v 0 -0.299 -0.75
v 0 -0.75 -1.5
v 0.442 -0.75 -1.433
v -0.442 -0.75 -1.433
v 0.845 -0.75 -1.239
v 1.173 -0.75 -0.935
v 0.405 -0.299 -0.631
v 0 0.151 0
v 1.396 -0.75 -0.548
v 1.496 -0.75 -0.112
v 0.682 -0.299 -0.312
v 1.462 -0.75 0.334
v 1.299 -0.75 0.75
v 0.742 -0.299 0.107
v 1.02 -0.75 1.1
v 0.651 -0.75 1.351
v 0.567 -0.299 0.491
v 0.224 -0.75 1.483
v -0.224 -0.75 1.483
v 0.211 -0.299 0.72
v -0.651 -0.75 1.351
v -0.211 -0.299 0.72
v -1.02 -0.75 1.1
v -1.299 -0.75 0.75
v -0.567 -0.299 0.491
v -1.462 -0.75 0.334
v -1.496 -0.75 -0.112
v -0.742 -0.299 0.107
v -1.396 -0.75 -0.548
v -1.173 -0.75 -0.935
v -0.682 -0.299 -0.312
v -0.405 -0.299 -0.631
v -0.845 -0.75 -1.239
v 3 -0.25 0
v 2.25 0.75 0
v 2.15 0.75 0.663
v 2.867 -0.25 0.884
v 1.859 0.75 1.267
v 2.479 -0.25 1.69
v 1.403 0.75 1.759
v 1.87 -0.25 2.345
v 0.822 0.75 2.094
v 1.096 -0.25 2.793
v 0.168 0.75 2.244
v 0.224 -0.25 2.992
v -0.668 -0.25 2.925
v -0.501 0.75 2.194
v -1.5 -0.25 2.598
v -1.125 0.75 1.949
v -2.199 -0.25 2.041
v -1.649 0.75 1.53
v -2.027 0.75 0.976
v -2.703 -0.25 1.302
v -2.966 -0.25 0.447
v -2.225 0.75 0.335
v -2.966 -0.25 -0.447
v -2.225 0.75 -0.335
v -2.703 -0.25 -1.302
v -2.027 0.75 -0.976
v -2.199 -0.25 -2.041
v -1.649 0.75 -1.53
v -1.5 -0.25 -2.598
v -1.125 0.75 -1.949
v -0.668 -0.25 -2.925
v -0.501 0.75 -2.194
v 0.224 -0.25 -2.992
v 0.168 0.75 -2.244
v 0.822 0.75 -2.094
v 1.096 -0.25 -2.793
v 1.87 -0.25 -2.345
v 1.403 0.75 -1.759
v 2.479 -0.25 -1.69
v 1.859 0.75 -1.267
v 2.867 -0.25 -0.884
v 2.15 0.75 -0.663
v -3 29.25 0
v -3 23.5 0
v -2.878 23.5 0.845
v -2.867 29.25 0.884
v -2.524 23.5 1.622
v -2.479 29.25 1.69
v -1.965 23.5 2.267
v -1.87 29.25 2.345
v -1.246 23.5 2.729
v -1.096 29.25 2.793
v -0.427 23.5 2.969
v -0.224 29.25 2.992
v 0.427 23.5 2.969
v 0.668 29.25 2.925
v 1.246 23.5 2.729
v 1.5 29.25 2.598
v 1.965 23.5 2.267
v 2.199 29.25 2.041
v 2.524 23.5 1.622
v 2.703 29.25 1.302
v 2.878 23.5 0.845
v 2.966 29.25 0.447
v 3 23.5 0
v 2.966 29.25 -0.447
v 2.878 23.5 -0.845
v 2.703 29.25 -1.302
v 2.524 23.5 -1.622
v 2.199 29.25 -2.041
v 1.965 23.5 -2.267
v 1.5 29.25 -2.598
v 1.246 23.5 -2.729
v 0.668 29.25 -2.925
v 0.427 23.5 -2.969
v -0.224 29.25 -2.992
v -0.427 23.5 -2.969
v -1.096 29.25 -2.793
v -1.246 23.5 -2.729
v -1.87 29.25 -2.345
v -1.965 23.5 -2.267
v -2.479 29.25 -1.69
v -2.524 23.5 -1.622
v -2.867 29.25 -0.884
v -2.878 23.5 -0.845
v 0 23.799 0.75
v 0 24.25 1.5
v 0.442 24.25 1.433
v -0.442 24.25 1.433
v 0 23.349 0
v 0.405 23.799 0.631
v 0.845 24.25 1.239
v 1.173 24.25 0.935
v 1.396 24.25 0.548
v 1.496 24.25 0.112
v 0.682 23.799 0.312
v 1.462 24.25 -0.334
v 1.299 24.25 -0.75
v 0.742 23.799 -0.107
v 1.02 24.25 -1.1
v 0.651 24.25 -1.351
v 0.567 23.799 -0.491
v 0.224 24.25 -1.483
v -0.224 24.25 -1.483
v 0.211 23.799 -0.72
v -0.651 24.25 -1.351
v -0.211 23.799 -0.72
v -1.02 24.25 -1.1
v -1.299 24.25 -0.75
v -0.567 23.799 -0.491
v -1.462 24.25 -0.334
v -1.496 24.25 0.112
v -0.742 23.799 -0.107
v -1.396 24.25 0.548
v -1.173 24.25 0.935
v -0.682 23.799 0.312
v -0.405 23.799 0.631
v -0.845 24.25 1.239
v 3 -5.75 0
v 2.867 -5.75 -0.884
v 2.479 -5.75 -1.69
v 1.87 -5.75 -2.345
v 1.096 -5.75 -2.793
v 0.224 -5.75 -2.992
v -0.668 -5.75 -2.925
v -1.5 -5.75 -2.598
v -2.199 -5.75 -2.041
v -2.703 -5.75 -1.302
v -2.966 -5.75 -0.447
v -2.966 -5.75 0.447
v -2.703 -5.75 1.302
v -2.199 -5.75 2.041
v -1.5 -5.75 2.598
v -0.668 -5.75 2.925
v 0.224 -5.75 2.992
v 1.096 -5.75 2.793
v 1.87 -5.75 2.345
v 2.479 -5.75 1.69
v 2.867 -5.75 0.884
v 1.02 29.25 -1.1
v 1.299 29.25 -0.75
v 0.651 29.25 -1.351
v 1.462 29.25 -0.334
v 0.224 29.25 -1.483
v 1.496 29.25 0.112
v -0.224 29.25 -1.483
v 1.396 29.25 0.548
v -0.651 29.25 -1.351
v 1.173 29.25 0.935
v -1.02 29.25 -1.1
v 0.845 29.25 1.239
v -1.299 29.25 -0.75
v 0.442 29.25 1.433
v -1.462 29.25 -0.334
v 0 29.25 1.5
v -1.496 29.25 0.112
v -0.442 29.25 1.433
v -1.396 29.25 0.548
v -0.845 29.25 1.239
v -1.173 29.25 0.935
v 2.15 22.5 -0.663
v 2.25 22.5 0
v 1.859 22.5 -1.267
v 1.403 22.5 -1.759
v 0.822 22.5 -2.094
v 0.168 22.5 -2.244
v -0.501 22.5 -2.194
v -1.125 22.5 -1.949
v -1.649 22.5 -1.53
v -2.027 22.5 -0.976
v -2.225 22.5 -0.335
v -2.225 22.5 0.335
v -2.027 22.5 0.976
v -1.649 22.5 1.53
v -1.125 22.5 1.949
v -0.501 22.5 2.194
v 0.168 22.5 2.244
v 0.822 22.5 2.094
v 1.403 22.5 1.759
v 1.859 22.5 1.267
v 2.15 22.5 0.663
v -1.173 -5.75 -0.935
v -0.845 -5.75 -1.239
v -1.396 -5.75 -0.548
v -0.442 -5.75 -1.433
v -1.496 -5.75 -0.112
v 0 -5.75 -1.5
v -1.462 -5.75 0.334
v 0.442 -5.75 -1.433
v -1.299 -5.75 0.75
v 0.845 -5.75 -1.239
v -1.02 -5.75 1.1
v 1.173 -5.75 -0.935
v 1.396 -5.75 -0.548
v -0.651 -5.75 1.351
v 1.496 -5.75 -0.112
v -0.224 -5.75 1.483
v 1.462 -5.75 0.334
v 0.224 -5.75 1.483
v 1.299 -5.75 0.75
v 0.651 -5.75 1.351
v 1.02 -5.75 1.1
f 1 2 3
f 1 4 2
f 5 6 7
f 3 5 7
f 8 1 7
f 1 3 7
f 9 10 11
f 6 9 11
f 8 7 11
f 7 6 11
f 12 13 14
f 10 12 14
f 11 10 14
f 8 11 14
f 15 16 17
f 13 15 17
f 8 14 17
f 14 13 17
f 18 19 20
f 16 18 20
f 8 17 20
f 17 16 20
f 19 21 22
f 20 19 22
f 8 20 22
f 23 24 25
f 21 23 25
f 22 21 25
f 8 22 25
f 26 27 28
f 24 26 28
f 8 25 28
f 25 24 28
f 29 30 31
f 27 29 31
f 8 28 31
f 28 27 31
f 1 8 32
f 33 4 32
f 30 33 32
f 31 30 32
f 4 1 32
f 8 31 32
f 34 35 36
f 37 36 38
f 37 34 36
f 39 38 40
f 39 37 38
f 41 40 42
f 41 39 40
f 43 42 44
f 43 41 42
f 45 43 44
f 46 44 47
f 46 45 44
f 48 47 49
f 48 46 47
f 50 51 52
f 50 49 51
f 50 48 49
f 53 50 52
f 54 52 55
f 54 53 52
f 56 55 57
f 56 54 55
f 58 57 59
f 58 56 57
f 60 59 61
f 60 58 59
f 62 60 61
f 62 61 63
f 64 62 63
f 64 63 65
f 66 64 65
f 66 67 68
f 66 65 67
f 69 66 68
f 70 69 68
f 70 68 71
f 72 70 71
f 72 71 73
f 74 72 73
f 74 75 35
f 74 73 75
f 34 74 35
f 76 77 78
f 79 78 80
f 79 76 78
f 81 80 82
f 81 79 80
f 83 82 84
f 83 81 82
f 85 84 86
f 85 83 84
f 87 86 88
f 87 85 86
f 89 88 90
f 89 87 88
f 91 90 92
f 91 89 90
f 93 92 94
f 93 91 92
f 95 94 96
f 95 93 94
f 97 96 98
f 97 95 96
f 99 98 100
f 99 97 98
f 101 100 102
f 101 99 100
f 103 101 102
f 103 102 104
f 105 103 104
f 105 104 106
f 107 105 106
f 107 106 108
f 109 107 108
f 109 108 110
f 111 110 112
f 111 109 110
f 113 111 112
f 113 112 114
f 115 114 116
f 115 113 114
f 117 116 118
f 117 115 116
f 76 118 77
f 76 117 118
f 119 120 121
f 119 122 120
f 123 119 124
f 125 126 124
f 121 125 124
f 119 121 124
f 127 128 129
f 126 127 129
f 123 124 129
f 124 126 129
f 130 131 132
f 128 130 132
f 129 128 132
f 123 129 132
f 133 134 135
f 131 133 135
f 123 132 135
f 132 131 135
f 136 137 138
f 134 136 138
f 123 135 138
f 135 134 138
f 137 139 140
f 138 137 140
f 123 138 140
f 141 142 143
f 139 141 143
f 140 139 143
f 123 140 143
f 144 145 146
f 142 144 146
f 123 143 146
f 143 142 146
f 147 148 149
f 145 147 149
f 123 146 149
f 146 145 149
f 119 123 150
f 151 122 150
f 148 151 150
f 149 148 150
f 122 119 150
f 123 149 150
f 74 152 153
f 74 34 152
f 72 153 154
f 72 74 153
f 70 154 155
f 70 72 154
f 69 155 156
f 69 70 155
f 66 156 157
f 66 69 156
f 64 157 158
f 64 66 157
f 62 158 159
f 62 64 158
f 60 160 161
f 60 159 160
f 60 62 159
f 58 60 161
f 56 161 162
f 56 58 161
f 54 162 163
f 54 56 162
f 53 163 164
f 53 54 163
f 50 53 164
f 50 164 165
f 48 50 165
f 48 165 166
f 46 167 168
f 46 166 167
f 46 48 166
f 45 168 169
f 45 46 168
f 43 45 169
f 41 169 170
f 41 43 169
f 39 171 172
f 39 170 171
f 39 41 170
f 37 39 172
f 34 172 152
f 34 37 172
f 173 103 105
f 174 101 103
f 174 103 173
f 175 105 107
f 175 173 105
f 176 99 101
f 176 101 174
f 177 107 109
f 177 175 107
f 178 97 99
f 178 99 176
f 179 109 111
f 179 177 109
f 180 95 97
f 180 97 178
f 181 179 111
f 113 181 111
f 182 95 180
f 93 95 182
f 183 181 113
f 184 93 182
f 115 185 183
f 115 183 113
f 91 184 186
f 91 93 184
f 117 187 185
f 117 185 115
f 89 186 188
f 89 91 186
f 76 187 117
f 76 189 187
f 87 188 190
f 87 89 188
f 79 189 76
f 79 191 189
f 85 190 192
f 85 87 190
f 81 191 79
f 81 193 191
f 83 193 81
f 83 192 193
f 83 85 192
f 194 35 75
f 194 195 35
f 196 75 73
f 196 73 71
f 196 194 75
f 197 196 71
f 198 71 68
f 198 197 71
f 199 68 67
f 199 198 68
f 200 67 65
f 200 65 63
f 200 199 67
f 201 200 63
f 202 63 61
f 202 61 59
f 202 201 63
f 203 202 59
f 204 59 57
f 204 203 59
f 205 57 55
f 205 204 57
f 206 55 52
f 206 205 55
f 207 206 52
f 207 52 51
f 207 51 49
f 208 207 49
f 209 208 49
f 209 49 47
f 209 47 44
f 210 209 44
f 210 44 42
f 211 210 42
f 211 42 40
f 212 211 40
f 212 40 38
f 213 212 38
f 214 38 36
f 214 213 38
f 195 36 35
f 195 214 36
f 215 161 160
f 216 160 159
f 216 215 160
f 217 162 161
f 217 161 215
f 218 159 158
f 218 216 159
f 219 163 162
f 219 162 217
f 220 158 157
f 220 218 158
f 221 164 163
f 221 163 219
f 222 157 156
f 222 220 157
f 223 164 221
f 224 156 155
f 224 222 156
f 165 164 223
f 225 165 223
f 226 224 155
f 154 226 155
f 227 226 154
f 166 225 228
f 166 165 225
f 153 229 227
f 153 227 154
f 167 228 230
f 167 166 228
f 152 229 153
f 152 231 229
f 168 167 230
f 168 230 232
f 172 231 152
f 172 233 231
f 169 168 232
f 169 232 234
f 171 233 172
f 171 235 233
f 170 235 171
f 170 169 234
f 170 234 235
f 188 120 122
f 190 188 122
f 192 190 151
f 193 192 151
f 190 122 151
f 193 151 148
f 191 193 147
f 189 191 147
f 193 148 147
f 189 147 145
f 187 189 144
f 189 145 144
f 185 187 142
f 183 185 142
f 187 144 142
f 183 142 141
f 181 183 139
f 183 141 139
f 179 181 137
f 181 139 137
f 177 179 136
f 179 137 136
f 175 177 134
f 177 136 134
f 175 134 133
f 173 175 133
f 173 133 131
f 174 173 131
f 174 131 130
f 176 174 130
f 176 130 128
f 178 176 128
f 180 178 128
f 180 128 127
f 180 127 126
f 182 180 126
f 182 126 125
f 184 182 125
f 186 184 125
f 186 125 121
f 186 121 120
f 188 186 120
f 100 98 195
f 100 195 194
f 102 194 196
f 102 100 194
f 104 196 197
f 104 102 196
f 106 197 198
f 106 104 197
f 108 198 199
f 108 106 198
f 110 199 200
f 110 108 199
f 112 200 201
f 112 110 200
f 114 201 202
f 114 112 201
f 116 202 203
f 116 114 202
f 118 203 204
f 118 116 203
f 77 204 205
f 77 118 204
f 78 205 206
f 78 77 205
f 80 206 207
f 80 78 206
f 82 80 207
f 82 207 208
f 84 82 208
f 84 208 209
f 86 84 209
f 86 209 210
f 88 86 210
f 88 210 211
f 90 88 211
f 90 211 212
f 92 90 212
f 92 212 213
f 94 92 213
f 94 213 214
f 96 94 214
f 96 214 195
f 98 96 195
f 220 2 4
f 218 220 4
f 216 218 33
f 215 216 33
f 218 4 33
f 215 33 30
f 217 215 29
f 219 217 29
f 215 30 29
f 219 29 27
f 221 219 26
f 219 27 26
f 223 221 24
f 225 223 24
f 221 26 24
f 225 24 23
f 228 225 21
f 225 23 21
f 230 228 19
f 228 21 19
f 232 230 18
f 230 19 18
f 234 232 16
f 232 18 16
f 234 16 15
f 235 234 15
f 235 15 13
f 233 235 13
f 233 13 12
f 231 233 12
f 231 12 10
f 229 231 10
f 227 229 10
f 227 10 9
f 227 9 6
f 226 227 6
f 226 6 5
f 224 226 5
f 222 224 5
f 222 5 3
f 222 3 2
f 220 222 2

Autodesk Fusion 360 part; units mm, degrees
sketch "Sketch2" plane through (0, 30, 0) normal (0, 1, 0) x (-1, 0, 0)
  circle A0 centre (0, 0) radius 3
  circle A1 centre (0, 0) radius 3
ref_plane "WorkPlane1" through (0, 23.5, 0) normal (0, 1, 0) x (-1, 0, 0)
ref_plane "WorkPlane2" through (0, 22.5, 0) normal (0, 1, 0) x (-1, 0, 0)
sketch "Sketch3" plane through (0, 22.5, 0) normal (0, 1, 0) x (1, 0, 0)
  circle A0 centre (0, 0) radius 2.25
  dimension "d12" = 4.5
sketch "Sketch4" plane through (0, 23.5, 0) normal (0, 1, 0) x (1, 0, 0)
  circle A0 centre (0, 0) radius 3
  dimension "d13" = 6
extrude "Extrude2" add sketch "Sketch2" against normal blind 6.5
loft "Loft1" add profiles "Sketch4", "Sketch3" section 1 section 2
extrude "Extrude3" add 1 faces at (-0.1619, 22.5, 0.6982) along direction (0, -1, 0) blind 21.75
ref_plane "WorkPlane3" through (0, -0.25, 0) normal (0, -1, 0) x (0, 0, -1)
sketch "Sketch5" plane through (0, -0.25, 0) normal (0, -1, 0) x (1, 0, 0)
  circle A0 centre (0, 0) radius 3
  dimension "d19" = 6
loft "Loft2" add profiles "Sketch5" section 1 face at (-0.1619, 0.75, 0.6982) section 2
extrude "Extrude4" add 1 faces at (-1.1591, -0.25, 0.5829) along direction (0, -1, 0) blind 5.5
extrude "Extrude5" cut 1 faces at (1.1591, 30, 0.5829) along direction (0, -1, 0) blind 0.75
hole "Hole3" at (0, 29.25, 0) direction (0, -1, 0) diameter 3 depth 5 tip angle 118
hole "Hole4" at (0, -5.75, 0) direction (0, 1, 0) diameter 3 depth 5 tip angle 118
thread "Thread3"
thread "Thread4"
